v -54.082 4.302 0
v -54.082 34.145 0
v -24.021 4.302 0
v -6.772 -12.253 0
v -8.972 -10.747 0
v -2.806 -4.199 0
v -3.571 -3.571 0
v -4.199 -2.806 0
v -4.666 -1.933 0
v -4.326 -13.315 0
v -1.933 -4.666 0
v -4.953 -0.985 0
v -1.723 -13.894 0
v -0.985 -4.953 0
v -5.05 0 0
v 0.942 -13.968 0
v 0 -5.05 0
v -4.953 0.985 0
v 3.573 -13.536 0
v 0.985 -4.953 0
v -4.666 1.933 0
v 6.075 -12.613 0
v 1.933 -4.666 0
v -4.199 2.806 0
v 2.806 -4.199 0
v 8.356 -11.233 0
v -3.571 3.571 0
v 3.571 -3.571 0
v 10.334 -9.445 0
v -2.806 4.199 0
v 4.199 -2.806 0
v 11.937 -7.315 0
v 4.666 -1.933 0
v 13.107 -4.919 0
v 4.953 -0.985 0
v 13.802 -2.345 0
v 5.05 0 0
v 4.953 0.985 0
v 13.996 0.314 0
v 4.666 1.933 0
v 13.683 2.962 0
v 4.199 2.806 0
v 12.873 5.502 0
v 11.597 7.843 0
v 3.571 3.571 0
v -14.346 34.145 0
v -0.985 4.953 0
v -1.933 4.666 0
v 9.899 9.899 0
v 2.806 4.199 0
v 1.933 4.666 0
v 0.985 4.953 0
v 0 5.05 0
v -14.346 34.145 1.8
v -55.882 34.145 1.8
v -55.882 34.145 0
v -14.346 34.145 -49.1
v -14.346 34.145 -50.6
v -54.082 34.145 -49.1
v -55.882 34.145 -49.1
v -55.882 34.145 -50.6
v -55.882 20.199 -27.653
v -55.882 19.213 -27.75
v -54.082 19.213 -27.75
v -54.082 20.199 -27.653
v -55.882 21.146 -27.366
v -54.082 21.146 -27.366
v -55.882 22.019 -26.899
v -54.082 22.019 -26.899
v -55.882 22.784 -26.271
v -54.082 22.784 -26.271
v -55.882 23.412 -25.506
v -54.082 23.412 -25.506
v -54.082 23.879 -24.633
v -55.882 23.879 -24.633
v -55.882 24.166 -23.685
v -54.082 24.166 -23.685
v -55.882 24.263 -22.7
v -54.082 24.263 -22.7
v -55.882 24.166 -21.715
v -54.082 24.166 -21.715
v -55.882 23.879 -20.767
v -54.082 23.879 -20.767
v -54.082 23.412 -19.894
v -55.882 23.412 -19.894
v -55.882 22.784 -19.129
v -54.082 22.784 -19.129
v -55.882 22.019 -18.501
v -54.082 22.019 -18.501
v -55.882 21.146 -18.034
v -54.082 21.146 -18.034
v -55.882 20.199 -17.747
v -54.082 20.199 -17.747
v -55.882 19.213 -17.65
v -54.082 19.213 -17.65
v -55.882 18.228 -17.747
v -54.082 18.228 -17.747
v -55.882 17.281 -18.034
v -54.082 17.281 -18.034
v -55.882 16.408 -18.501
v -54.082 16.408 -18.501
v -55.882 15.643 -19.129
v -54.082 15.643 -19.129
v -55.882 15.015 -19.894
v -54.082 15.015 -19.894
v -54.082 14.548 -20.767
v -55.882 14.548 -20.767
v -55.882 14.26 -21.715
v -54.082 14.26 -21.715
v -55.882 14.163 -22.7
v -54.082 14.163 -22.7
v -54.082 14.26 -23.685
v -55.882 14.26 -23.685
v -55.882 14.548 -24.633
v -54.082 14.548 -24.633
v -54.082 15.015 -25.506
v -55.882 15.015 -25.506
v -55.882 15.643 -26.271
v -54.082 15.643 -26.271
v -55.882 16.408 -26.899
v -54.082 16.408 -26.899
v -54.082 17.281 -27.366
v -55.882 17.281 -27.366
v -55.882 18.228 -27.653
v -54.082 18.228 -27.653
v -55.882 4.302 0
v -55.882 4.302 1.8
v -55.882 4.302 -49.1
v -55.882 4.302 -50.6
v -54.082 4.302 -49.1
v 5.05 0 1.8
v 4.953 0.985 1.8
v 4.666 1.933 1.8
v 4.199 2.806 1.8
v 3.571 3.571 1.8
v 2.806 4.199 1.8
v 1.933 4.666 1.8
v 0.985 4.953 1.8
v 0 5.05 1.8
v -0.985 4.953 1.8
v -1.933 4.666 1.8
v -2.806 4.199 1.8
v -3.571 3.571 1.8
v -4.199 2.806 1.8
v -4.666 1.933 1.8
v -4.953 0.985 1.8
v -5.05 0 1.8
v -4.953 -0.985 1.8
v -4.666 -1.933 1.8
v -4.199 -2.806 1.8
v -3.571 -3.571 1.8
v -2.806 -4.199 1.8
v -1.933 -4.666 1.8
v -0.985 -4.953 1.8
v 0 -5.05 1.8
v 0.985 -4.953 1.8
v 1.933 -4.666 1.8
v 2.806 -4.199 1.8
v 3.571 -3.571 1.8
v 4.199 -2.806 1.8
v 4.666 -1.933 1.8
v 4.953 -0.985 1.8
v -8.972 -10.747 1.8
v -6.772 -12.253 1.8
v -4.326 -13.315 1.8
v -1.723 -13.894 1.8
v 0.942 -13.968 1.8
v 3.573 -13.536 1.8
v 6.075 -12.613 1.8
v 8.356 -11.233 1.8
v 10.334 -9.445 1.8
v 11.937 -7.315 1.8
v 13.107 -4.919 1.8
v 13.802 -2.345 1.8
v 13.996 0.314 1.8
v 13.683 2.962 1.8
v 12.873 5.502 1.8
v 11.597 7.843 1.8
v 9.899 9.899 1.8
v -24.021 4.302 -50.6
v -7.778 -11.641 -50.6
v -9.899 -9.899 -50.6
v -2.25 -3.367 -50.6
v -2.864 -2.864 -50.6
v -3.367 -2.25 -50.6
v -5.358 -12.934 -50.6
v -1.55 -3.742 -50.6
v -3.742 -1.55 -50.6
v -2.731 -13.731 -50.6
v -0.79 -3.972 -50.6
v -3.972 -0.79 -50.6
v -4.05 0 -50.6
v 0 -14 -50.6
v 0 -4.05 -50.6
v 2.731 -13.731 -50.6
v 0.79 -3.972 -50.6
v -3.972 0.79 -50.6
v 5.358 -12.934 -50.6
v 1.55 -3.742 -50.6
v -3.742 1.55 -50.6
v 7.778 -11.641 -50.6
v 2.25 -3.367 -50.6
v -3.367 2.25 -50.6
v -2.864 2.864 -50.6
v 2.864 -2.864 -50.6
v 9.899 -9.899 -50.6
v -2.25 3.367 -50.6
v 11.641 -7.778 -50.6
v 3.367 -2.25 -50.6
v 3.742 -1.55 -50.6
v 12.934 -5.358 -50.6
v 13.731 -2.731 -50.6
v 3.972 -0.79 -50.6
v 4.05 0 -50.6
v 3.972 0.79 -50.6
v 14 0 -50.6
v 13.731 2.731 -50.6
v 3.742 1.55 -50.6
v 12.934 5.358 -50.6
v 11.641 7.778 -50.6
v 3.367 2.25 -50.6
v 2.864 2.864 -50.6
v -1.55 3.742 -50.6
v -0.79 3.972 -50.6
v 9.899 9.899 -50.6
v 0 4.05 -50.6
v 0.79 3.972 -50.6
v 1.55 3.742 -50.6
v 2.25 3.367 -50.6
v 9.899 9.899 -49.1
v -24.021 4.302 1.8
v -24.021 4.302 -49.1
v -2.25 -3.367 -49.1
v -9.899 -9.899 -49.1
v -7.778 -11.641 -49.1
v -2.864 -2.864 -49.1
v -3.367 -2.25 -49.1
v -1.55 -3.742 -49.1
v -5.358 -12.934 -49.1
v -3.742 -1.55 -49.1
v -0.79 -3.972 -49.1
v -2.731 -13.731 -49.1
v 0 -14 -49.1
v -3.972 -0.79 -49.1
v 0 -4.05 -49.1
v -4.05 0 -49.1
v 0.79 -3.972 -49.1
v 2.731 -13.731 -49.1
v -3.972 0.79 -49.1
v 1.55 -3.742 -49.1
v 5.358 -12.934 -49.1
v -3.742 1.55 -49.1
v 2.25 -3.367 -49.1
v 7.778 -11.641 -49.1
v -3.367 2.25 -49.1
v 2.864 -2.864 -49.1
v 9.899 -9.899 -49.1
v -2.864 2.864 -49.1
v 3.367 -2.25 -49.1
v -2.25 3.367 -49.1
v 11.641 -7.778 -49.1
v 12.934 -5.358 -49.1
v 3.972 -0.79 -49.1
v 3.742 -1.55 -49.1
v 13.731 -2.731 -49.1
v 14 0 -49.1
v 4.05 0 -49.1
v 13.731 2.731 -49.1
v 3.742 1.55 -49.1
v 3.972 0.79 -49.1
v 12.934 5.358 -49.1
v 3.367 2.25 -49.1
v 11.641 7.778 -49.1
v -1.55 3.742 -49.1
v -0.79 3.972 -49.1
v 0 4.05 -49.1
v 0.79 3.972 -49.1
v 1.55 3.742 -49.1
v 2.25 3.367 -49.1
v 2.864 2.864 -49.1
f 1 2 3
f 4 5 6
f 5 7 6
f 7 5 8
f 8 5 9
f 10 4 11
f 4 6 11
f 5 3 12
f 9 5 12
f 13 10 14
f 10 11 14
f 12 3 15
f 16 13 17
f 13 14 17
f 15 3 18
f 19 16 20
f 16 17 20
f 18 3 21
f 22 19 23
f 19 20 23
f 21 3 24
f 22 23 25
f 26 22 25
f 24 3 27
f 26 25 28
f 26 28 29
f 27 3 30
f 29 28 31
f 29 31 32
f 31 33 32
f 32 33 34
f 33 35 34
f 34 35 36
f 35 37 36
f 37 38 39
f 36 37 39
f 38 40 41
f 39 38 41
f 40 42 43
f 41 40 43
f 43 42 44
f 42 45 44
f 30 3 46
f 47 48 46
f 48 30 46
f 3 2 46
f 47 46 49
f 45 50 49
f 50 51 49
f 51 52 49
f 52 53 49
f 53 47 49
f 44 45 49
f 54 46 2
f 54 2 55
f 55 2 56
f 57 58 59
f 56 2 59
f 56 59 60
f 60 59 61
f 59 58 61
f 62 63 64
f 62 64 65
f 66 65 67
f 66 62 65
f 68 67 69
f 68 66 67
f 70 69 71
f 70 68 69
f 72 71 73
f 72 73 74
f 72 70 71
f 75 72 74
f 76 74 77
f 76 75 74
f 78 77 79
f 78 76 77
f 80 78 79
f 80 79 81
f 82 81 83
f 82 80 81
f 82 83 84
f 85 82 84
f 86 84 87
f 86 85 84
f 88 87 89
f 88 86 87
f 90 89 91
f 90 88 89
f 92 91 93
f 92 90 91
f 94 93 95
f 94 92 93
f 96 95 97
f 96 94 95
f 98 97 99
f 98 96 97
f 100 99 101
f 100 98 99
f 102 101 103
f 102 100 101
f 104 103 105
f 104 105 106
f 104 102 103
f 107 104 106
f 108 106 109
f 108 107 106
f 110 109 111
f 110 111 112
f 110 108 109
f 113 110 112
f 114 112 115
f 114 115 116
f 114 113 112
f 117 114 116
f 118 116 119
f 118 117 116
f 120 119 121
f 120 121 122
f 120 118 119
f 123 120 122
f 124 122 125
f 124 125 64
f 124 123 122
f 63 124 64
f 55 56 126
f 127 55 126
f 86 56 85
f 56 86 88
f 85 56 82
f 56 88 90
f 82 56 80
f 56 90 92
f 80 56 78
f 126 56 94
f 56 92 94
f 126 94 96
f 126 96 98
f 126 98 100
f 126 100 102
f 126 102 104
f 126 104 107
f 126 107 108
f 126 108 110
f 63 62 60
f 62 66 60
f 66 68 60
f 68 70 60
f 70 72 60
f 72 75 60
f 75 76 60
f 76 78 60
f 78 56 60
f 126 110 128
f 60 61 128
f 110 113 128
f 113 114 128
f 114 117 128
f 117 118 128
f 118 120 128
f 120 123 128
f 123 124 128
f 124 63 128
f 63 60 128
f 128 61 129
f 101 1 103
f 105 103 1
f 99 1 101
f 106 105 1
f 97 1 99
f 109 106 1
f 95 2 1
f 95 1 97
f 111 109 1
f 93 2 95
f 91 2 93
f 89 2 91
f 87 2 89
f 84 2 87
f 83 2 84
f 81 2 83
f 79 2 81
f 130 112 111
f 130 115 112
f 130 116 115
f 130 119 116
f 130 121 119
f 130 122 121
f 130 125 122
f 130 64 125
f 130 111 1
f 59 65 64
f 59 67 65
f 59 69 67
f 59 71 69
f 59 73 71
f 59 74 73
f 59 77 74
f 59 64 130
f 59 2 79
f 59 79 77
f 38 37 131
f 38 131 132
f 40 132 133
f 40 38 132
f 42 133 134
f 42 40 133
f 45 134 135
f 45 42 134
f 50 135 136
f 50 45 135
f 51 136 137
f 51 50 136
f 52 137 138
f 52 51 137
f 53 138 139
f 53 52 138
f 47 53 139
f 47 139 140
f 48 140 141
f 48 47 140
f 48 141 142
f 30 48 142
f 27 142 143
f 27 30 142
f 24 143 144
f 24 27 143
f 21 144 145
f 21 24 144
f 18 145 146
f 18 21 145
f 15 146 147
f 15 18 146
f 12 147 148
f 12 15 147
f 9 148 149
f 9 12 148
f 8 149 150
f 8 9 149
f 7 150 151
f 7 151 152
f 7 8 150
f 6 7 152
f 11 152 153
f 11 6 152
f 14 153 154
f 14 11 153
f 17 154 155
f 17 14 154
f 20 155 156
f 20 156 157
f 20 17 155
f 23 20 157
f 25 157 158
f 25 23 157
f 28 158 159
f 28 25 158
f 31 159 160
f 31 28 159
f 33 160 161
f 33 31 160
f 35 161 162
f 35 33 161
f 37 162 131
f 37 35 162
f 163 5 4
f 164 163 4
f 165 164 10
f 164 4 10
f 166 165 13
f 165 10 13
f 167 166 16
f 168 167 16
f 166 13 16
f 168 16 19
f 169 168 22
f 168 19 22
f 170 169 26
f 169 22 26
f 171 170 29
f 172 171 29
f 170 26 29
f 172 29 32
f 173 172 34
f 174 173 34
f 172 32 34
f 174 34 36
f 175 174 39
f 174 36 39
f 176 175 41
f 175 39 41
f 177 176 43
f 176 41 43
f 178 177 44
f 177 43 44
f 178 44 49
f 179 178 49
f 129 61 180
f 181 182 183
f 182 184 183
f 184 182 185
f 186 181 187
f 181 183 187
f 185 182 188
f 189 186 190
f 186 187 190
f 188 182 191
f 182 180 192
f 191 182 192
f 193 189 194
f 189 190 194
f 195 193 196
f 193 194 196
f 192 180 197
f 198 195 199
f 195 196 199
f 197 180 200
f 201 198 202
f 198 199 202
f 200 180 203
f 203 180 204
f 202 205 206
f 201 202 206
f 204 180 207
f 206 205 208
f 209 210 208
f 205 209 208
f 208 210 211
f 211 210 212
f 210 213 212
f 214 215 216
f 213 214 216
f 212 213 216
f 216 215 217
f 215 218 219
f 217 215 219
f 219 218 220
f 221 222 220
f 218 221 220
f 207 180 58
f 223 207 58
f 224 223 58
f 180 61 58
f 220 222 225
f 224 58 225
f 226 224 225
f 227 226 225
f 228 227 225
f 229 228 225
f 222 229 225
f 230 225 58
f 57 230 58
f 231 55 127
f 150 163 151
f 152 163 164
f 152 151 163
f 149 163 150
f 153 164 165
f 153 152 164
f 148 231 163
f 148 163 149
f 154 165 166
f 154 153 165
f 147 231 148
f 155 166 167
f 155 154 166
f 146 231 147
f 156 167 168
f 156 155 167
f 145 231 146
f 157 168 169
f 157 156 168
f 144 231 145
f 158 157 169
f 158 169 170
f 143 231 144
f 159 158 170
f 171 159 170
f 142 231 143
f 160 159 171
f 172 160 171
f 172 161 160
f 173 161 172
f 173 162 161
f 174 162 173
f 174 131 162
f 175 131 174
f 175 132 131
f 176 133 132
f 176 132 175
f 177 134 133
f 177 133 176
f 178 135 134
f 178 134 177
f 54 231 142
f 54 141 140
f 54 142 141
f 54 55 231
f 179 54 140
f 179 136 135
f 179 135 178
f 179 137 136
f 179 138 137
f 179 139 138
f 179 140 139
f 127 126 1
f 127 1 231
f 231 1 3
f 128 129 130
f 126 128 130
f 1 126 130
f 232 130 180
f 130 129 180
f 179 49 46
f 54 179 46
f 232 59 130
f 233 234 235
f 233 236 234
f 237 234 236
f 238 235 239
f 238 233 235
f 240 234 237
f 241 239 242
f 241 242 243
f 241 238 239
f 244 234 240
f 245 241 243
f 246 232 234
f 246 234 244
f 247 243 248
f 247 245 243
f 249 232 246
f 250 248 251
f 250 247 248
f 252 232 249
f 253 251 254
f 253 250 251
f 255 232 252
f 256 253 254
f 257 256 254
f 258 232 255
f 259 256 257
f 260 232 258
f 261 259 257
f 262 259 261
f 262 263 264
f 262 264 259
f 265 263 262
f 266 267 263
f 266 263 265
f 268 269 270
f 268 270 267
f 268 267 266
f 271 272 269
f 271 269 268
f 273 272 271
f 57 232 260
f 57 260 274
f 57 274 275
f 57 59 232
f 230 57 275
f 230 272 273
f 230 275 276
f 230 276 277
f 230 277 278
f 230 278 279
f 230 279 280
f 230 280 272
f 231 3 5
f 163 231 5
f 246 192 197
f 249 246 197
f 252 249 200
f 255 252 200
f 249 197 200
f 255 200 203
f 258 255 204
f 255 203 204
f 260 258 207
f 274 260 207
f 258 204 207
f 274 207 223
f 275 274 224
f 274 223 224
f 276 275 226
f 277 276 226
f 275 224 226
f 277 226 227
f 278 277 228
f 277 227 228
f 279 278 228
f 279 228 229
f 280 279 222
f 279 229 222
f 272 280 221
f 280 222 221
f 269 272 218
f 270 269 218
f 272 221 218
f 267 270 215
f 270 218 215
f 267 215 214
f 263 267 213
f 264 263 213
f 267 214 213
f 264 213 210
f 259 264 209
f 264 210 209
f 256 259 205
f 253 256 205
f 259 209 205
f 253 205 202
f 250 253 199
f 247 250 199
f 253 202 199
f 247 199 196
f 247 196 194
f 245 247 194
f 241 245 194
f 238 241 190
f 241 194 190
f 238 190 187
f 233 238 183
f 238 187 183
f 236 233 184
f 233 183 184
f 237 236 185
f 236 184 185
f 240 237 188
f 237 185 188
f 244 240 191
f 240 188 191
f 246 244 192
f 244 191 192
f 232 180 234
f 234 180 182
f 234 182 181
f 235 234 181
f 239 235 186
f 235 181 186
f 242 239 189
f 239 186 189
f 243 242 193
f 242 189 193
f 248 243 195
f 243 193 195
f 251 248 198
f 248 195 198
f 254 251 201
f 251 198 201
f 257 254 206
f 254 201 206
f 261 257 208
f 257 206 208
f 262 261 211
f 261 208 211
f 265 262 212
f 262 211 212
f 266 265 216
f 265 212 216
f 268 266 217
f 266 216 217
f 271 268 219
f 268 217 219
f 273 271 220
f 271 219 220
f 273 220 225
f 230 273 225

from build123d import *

# Parameters (mm, degrees)
ESBO_O1_R                = 5.05
RESSALTO_EXTRUS_O2_DEPTH = 1.8
ESBO_O2_W                = 49.1
ESBO_O2_H                = 29.842997711
ESBO_O2_R                = 5.05
RESSALTO_EXTRUS_O3_DEPTH = 1.8
RESSALTO_EXTRUS_O5_START = 1.5
ESBO_O3_R                = 4.05
RESSALTO_EXTRUS_O5_DEPTH = 1.5


with BuildPart() as part:
    # Esboço1 → Ressalto-extrusão2 (new body)
    with BuildSketch(Plane.XY):
        with BuildLine():
            Line((9.899494937, 9.899494937), (-14.345555324, 34.144545197))
            Line((-14.345555324, 34.144545197), (-55.882327004, 34.144545197))
            Line((-55.882327004, 34.144545197), (-55.882327004, 4.301547486))
            Line((-55.882327004, 4.301547486), (-24.020751859, 4.301547486))
            Line((-24.020751859, 4.301547486), (-8.97177071, -10.747433663))
            ThreePointArc((-8.97177071, -10.747433663), (10.333880356, -9.445153085), (9.899494937, 9.899494937))
        make_face()
        Circle(ESBO_O1_R, mode=Mode.SUBTRACT)
    extrude(amount=RESSALTO_EXTRUS_O2_DEPTH)

    # Esboço2 → Ressalto-extrusão3 (add)
    with BuildSketch(Plane(origin=(-55.882327004, 0, 0), x_dir=(0, 0, -1), z_dir=(1, 0, 0))):
        with Locations((24.55, 19.223046342)):
            Rectangle(ESBO_O2_W, ESBO_O2_H)
        with Locations((22.7, 19.213463732)):
            Circle(ESBO_O2_R, mode=Mode.SUBTRACT)
    extrude(amount=RESSALTO_EXTRUS_O3_DEPTH)

    # Esboço3 → Ressalto-extrusão5 (add)
    with BuildSketch(Plane(origin=(0, 0, -49.1), x_dir=(-1, 0, 0), z_dir=(0, 0, -1)).offset(RESSALTO_EXTRUS_O5_START)):
        with BuildLine():
            Line((-9.899494937, 9.899494937), (14.345555324, 34.144545197))
            Line((14.345555324, 34.144545197), (55.882327004, 34.144545197))
            Line((55.882327004, 34.144545197), (55.882327004, 4.301547486))
            Line((55.882327004, 4.301547486), (24.020751859, 4.301547486))
            Line((24.020751859, 4.301547486), (9.899494937, -9.899494937))
            ThreePointArc((9.899494937, -9.899494937), (-9.899494937, -9.899494937), (-9.899494937, 9.899494937))
        make_face()
        Circle(ESBO_O3_R, mode=Mode.SUBTRACT)
    extrude(amount=-RESSALTO_EXTRUS_O5_DEPTH)


solid = part.part
